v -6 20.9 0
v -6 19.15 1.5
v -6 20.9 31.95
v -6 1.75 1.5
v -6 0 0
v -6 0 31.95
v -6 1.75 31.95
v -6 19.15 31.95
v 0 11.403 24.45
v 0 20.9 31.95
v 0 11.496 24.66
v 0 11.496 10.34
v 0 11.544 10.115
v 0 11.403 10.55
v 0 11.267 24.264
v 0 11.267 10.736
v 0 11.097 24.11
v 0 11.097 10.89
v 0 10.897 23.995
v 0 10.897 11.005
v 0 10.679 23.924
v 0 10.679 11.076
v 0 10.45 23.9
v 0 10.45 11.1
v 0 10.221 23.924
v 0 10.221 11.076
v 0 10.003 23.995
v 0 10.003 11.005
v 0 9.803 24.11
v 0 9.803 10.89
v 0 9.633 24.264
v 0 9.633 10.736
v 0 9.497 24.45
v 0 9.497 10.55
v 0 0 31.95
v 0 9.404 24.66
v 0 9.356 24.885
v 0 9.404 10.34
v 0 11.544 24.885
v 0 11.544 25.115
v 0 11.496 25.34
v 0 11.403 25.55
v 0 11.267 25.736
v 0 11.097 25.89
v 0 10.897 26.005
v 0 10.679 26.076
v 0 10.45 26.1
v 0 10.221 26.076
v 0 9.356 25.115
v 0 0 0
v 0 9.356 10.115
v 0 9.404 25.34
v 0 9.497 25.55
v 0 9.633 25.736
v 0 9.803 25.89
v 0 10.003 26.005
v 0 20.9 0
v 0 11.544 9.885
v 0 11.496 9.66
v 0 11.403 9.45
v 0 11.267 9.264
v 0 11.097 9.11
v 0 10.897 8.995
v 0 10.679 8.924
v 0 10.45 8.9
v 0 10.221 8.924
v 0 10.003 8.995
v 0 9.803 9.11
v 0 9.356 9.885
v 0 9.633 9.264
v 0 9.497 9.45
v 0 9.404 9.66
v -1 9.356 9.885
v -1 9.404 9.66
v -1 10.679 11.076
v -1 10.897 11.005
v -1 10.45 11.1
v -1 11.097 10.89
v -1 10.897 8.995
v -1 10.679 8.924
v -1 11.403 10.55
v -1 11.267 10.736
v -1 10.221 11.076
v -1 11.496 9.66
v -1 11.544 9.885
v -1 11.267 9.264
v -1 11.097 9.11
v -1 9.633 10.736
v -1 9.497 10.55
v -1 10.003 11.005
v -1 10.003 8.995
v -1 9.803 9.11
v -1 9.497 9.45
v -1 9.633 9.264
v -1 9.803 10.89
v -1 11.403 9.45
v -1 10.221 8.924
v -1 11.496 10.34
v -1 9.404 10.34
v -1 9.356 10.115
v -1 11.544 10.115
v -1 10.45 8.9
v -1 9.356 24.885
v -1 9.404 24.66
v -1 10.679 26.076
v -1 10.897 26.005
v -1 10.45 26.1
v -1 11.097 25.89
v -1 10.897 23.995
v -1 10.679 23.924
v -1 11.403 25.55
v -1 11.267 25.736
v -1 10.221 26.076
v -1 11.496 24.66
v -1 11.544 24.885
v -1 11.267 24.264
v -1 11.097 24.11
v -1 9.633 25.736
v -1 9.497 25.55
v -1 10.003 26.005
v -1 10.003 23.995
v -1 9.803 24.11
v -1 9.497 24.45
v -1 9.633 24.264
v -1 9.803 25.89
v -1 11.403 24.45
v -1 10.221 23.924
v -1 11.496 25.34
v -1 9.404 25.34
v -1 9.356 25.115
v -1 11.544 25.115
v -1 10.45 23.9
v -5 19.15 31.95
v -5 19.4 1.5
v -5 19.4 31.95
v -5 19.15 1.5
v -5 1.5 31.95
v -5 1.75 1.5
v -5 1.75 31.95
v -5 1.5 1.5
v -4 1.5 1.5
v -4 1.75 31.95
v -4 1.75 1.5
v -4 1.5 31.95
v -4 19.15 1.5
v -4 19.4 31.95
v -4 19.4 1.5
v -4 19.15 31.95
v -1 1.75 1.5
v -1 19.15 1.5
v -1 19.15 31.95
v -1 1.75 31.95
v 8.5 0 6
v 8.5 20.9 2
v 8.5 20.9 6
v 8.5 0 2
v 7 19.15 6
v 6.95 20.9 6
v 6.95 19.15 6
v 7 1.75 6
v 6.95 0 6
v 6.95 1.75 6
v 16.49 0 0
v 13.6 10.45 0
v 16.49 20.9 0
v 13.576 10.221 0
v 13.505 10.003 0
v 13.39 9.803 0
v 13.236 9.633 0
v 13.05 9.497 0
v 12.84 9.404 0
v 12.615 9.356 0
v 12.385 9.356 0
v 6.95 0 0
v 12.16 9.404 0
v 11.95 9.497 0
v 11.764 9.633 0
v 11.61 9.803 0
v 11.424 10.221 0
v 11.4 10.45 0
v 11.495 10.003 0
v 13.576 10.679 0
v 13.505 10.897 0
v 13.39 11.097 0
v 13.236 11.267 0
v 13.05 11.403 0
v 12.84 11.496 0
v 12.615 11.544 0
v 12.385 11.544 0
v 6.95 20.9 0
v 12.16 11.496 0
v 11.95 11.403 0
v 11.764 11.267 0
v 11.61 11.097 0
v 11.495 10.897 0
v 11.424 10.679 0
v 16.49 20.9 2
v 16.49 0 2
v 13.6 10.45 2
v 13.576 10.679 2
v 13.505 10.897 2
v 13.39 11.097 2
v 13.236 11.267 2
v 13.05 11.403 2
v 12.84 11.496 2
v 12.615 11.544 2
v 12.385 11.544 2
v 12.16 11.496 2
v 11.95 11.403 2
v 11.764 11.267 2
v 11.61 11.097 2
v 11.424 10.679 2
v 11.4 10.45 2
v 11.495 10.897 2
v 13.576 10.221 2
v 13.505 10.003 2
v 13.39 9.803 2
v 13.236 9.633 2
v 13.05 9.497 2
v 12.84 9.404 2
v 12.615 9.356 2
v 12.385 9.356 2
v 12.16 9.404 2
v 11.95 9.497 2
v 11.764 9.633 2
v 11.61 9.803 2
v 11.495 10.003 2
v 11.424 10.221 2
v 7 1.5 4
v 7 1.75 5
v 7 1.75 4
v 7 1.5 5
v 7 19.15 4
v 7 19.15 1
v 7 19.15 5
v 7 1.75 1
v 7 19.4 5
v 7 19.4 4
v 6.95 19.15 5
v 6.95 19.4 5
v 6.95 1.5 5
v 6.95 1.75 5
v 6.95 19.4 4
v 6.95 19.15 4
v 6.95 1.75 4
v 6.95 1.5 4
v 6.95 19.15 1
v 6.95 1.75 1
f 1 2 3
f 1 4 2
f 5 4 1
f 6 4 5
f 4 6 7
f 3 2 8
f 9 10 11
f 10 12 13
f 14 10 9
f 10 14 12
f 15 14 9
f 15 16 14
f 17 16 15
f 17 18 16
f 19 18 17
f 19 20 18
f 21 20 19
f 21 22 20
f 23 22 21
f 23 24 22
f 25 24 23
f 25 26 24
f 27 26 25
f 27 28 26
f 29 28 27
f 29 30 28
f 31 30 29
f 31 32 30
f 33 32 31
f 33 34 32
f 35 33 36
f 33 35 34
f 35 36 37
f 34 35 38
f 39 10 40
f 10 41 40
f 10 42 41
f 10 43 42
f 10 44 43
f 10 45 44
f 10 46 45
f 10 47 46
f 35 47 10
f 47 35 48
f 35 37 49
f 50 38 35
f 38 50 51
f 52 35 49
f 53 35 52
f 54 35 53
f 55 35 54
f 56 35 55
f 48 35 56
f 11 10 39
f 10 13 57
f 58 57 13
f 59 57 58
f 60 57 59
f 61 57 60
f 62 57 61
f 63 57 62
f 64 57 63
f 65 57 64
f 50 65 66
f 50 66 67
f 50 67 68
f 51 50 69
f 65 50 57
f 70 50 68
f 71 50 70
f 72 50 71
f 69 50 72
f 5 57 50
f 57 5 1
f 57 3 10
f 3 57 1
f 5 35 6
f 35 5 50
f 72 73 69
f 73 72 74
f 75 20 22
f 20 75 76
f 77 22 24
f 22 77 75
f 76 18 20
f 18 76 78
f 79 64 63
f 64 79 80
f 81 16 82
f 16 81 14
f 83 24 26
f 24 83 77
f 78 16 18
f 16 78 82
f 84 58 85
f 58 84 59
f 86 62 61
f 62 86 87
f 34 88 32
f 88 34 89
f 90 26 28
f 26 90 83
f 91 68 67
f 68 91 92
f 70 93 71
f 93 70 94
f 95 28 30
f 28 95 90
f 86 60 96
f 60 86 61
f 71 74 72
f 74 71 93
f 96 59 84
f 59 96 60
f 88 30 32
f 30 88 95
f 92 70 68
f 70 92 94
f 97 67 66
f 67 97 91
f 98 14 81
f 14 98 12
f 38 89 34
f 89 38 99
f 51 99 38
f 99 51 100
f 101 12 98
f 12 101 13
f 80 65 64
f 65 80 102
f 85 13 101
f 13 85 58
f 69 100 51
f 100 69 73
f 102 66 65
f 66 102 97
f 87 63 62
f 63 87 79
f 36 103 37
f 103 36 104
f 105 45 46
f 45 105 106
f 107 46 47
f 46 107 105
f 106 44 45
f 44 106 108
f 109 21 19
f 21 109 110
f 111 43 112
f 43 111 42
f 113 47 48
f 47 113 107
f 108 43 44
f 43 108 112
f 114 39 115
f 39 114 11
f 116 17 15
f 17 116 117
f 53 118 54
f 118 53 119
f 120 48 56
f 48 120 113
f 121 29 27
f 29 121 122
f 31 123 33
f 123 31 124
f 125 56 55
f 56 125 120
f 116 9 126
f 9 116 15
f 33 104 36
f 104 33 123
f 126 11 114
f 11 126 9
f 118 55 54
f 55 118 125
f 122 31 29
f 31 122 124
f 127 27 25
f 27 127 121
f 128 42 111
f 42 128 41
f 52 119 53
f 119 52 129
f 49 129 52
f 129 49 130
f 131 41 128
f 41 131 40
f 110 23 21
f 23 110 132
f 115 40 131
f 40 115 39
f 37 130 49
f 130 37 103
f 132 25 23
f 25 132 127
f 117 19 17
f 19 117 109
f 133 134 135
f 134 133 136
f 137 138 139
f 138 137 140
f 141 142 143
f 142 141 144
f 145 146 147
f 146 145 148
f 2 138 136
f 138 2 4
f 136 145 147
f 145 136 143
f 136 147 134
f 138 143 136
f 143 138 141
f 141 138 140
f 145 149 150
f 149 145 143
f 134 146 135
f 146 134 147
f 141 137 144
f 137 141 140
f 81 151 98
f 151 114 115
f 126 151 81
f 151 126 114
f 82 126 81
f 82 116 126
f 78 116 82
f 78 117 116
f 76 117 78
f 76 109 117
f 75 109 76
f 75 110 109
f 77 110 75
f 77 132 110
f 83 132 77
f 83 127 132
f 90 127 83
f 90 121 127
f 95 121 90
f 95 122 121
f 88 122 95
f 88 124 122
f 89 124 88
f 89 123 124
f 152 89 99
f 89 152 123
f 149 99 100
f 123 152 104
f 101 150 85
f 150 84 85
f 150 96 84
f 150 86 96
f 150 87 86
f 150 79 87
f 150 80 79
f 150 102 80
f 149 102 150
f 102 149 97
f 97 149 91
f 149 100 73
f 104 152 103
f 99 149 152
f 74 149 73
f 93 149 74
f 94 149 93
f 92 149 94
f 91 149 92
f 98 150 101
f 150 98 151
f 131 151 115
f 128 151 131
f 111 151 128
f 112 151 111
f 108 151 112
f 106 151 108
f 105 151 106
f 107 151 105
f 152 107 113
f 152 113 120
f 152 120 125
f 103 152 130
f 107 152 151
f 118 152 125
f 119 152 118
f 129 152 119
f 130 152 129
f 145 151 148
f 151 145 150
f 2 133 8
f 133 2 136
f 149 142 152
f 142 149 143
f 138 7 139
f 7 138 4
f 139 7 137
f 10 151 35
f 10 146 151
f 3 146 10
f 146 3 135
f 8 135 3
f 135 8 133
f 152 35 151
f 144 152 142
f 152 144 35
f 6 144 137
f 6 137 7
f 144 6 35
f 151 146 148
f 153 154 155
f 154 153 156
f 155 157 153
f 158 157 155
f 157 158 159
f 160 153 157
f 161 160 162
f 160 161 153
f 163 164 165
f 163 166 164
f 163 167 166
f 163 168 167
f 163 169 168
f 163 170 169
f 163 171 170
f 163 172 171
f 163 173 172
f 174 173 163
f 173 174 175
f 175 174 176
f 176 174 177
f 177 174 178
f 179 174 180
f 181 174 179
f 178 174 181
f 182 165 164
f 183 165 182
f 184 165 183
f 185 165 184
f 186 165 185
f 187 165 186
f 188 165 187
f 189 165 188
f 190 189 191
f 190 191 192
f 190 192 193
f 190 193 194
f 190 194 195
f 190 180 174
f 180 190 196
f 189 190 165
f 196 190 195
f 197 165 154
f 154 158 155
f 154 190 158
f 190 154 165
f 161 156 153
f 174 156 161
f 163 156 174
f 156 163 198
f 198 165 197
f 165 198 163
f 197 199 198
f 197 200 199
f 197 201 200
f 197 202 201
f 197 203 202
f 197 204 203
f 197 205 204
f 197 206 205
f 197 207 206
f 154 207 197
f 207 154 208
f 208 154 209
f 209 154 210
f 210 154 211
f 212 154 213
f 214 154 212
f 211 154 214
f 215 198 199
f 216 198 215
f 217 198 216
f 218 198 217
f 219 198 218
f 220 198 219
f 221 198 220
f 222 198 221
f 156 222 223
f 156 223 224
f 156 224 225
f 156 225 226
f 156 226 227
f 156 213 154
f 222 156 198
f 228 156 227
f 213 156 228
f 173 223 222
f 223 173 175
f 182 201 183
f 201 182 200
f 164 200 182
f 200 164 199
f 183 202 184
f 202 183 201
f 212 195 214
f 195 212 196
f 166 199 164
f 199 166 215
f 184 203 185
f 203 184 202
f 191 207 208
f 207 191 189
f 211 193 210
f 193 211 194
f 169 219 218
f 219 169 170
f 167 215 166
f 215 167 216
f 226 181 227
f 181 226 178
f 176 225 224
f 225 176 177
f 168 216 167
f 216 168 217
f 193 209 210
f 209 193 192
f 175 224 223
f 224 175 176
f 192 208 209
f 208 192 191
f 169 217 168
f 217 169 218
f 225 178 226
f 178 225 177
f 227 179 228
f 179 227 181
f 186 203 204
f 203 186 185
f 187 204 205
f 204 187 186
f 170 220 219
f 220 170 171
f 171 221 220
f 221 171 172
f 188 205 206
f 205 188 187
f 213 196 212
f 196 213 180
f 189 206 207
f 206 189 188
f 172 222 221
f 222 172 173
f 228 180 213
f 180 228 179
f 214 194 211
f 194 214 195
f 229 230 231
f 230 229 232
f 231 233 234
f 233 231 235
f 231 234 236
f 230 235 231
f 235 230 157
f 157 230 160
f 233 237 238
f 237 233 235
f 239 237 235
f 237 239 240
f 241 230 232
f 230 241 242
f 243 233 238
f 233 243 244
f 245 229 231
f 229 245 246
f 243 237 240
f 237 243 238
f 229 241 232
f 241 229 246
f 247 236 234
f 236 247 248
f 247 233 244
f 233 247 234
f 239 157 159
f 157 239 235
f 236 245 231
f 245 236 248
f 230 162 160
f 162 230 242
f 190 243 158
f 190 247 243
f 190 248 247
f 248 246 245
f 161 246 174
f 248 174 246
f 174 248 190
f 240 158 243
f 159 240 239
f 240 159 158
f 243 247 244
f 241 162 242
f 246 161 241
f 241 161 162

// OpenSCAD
board_dims = [30.5, 17.9, 1];
$fs = 0.1;

module holder() {
difference() {
	union() {
		cube([30.5+3,17.9+3,6]);
		translate([30.5+3-0.01,0,0]) cube([8, 17.9+3, 2]);
	}
	translate([3/2,3/2, 4])
		cube(board_dims);
	translate([3/2, 3/2+0.5/2, 1])
		cube(board_dims + [0,-0.5,10]);

	for (i = [10,25, 37.5])
	translate([i,(17.9+3)/2, -1])
		cylinder(d = 2.2, h = 5);

}
}
module splitter() {
translate([30.5 + 1.5-0.05,-1,-1])
		cube(50);
}

rotate([0,-90,0])
difference() {
	holder();
	splitter();
}
translate([-25,0,0])
intersection() {
	holder();
	splitter();
}
